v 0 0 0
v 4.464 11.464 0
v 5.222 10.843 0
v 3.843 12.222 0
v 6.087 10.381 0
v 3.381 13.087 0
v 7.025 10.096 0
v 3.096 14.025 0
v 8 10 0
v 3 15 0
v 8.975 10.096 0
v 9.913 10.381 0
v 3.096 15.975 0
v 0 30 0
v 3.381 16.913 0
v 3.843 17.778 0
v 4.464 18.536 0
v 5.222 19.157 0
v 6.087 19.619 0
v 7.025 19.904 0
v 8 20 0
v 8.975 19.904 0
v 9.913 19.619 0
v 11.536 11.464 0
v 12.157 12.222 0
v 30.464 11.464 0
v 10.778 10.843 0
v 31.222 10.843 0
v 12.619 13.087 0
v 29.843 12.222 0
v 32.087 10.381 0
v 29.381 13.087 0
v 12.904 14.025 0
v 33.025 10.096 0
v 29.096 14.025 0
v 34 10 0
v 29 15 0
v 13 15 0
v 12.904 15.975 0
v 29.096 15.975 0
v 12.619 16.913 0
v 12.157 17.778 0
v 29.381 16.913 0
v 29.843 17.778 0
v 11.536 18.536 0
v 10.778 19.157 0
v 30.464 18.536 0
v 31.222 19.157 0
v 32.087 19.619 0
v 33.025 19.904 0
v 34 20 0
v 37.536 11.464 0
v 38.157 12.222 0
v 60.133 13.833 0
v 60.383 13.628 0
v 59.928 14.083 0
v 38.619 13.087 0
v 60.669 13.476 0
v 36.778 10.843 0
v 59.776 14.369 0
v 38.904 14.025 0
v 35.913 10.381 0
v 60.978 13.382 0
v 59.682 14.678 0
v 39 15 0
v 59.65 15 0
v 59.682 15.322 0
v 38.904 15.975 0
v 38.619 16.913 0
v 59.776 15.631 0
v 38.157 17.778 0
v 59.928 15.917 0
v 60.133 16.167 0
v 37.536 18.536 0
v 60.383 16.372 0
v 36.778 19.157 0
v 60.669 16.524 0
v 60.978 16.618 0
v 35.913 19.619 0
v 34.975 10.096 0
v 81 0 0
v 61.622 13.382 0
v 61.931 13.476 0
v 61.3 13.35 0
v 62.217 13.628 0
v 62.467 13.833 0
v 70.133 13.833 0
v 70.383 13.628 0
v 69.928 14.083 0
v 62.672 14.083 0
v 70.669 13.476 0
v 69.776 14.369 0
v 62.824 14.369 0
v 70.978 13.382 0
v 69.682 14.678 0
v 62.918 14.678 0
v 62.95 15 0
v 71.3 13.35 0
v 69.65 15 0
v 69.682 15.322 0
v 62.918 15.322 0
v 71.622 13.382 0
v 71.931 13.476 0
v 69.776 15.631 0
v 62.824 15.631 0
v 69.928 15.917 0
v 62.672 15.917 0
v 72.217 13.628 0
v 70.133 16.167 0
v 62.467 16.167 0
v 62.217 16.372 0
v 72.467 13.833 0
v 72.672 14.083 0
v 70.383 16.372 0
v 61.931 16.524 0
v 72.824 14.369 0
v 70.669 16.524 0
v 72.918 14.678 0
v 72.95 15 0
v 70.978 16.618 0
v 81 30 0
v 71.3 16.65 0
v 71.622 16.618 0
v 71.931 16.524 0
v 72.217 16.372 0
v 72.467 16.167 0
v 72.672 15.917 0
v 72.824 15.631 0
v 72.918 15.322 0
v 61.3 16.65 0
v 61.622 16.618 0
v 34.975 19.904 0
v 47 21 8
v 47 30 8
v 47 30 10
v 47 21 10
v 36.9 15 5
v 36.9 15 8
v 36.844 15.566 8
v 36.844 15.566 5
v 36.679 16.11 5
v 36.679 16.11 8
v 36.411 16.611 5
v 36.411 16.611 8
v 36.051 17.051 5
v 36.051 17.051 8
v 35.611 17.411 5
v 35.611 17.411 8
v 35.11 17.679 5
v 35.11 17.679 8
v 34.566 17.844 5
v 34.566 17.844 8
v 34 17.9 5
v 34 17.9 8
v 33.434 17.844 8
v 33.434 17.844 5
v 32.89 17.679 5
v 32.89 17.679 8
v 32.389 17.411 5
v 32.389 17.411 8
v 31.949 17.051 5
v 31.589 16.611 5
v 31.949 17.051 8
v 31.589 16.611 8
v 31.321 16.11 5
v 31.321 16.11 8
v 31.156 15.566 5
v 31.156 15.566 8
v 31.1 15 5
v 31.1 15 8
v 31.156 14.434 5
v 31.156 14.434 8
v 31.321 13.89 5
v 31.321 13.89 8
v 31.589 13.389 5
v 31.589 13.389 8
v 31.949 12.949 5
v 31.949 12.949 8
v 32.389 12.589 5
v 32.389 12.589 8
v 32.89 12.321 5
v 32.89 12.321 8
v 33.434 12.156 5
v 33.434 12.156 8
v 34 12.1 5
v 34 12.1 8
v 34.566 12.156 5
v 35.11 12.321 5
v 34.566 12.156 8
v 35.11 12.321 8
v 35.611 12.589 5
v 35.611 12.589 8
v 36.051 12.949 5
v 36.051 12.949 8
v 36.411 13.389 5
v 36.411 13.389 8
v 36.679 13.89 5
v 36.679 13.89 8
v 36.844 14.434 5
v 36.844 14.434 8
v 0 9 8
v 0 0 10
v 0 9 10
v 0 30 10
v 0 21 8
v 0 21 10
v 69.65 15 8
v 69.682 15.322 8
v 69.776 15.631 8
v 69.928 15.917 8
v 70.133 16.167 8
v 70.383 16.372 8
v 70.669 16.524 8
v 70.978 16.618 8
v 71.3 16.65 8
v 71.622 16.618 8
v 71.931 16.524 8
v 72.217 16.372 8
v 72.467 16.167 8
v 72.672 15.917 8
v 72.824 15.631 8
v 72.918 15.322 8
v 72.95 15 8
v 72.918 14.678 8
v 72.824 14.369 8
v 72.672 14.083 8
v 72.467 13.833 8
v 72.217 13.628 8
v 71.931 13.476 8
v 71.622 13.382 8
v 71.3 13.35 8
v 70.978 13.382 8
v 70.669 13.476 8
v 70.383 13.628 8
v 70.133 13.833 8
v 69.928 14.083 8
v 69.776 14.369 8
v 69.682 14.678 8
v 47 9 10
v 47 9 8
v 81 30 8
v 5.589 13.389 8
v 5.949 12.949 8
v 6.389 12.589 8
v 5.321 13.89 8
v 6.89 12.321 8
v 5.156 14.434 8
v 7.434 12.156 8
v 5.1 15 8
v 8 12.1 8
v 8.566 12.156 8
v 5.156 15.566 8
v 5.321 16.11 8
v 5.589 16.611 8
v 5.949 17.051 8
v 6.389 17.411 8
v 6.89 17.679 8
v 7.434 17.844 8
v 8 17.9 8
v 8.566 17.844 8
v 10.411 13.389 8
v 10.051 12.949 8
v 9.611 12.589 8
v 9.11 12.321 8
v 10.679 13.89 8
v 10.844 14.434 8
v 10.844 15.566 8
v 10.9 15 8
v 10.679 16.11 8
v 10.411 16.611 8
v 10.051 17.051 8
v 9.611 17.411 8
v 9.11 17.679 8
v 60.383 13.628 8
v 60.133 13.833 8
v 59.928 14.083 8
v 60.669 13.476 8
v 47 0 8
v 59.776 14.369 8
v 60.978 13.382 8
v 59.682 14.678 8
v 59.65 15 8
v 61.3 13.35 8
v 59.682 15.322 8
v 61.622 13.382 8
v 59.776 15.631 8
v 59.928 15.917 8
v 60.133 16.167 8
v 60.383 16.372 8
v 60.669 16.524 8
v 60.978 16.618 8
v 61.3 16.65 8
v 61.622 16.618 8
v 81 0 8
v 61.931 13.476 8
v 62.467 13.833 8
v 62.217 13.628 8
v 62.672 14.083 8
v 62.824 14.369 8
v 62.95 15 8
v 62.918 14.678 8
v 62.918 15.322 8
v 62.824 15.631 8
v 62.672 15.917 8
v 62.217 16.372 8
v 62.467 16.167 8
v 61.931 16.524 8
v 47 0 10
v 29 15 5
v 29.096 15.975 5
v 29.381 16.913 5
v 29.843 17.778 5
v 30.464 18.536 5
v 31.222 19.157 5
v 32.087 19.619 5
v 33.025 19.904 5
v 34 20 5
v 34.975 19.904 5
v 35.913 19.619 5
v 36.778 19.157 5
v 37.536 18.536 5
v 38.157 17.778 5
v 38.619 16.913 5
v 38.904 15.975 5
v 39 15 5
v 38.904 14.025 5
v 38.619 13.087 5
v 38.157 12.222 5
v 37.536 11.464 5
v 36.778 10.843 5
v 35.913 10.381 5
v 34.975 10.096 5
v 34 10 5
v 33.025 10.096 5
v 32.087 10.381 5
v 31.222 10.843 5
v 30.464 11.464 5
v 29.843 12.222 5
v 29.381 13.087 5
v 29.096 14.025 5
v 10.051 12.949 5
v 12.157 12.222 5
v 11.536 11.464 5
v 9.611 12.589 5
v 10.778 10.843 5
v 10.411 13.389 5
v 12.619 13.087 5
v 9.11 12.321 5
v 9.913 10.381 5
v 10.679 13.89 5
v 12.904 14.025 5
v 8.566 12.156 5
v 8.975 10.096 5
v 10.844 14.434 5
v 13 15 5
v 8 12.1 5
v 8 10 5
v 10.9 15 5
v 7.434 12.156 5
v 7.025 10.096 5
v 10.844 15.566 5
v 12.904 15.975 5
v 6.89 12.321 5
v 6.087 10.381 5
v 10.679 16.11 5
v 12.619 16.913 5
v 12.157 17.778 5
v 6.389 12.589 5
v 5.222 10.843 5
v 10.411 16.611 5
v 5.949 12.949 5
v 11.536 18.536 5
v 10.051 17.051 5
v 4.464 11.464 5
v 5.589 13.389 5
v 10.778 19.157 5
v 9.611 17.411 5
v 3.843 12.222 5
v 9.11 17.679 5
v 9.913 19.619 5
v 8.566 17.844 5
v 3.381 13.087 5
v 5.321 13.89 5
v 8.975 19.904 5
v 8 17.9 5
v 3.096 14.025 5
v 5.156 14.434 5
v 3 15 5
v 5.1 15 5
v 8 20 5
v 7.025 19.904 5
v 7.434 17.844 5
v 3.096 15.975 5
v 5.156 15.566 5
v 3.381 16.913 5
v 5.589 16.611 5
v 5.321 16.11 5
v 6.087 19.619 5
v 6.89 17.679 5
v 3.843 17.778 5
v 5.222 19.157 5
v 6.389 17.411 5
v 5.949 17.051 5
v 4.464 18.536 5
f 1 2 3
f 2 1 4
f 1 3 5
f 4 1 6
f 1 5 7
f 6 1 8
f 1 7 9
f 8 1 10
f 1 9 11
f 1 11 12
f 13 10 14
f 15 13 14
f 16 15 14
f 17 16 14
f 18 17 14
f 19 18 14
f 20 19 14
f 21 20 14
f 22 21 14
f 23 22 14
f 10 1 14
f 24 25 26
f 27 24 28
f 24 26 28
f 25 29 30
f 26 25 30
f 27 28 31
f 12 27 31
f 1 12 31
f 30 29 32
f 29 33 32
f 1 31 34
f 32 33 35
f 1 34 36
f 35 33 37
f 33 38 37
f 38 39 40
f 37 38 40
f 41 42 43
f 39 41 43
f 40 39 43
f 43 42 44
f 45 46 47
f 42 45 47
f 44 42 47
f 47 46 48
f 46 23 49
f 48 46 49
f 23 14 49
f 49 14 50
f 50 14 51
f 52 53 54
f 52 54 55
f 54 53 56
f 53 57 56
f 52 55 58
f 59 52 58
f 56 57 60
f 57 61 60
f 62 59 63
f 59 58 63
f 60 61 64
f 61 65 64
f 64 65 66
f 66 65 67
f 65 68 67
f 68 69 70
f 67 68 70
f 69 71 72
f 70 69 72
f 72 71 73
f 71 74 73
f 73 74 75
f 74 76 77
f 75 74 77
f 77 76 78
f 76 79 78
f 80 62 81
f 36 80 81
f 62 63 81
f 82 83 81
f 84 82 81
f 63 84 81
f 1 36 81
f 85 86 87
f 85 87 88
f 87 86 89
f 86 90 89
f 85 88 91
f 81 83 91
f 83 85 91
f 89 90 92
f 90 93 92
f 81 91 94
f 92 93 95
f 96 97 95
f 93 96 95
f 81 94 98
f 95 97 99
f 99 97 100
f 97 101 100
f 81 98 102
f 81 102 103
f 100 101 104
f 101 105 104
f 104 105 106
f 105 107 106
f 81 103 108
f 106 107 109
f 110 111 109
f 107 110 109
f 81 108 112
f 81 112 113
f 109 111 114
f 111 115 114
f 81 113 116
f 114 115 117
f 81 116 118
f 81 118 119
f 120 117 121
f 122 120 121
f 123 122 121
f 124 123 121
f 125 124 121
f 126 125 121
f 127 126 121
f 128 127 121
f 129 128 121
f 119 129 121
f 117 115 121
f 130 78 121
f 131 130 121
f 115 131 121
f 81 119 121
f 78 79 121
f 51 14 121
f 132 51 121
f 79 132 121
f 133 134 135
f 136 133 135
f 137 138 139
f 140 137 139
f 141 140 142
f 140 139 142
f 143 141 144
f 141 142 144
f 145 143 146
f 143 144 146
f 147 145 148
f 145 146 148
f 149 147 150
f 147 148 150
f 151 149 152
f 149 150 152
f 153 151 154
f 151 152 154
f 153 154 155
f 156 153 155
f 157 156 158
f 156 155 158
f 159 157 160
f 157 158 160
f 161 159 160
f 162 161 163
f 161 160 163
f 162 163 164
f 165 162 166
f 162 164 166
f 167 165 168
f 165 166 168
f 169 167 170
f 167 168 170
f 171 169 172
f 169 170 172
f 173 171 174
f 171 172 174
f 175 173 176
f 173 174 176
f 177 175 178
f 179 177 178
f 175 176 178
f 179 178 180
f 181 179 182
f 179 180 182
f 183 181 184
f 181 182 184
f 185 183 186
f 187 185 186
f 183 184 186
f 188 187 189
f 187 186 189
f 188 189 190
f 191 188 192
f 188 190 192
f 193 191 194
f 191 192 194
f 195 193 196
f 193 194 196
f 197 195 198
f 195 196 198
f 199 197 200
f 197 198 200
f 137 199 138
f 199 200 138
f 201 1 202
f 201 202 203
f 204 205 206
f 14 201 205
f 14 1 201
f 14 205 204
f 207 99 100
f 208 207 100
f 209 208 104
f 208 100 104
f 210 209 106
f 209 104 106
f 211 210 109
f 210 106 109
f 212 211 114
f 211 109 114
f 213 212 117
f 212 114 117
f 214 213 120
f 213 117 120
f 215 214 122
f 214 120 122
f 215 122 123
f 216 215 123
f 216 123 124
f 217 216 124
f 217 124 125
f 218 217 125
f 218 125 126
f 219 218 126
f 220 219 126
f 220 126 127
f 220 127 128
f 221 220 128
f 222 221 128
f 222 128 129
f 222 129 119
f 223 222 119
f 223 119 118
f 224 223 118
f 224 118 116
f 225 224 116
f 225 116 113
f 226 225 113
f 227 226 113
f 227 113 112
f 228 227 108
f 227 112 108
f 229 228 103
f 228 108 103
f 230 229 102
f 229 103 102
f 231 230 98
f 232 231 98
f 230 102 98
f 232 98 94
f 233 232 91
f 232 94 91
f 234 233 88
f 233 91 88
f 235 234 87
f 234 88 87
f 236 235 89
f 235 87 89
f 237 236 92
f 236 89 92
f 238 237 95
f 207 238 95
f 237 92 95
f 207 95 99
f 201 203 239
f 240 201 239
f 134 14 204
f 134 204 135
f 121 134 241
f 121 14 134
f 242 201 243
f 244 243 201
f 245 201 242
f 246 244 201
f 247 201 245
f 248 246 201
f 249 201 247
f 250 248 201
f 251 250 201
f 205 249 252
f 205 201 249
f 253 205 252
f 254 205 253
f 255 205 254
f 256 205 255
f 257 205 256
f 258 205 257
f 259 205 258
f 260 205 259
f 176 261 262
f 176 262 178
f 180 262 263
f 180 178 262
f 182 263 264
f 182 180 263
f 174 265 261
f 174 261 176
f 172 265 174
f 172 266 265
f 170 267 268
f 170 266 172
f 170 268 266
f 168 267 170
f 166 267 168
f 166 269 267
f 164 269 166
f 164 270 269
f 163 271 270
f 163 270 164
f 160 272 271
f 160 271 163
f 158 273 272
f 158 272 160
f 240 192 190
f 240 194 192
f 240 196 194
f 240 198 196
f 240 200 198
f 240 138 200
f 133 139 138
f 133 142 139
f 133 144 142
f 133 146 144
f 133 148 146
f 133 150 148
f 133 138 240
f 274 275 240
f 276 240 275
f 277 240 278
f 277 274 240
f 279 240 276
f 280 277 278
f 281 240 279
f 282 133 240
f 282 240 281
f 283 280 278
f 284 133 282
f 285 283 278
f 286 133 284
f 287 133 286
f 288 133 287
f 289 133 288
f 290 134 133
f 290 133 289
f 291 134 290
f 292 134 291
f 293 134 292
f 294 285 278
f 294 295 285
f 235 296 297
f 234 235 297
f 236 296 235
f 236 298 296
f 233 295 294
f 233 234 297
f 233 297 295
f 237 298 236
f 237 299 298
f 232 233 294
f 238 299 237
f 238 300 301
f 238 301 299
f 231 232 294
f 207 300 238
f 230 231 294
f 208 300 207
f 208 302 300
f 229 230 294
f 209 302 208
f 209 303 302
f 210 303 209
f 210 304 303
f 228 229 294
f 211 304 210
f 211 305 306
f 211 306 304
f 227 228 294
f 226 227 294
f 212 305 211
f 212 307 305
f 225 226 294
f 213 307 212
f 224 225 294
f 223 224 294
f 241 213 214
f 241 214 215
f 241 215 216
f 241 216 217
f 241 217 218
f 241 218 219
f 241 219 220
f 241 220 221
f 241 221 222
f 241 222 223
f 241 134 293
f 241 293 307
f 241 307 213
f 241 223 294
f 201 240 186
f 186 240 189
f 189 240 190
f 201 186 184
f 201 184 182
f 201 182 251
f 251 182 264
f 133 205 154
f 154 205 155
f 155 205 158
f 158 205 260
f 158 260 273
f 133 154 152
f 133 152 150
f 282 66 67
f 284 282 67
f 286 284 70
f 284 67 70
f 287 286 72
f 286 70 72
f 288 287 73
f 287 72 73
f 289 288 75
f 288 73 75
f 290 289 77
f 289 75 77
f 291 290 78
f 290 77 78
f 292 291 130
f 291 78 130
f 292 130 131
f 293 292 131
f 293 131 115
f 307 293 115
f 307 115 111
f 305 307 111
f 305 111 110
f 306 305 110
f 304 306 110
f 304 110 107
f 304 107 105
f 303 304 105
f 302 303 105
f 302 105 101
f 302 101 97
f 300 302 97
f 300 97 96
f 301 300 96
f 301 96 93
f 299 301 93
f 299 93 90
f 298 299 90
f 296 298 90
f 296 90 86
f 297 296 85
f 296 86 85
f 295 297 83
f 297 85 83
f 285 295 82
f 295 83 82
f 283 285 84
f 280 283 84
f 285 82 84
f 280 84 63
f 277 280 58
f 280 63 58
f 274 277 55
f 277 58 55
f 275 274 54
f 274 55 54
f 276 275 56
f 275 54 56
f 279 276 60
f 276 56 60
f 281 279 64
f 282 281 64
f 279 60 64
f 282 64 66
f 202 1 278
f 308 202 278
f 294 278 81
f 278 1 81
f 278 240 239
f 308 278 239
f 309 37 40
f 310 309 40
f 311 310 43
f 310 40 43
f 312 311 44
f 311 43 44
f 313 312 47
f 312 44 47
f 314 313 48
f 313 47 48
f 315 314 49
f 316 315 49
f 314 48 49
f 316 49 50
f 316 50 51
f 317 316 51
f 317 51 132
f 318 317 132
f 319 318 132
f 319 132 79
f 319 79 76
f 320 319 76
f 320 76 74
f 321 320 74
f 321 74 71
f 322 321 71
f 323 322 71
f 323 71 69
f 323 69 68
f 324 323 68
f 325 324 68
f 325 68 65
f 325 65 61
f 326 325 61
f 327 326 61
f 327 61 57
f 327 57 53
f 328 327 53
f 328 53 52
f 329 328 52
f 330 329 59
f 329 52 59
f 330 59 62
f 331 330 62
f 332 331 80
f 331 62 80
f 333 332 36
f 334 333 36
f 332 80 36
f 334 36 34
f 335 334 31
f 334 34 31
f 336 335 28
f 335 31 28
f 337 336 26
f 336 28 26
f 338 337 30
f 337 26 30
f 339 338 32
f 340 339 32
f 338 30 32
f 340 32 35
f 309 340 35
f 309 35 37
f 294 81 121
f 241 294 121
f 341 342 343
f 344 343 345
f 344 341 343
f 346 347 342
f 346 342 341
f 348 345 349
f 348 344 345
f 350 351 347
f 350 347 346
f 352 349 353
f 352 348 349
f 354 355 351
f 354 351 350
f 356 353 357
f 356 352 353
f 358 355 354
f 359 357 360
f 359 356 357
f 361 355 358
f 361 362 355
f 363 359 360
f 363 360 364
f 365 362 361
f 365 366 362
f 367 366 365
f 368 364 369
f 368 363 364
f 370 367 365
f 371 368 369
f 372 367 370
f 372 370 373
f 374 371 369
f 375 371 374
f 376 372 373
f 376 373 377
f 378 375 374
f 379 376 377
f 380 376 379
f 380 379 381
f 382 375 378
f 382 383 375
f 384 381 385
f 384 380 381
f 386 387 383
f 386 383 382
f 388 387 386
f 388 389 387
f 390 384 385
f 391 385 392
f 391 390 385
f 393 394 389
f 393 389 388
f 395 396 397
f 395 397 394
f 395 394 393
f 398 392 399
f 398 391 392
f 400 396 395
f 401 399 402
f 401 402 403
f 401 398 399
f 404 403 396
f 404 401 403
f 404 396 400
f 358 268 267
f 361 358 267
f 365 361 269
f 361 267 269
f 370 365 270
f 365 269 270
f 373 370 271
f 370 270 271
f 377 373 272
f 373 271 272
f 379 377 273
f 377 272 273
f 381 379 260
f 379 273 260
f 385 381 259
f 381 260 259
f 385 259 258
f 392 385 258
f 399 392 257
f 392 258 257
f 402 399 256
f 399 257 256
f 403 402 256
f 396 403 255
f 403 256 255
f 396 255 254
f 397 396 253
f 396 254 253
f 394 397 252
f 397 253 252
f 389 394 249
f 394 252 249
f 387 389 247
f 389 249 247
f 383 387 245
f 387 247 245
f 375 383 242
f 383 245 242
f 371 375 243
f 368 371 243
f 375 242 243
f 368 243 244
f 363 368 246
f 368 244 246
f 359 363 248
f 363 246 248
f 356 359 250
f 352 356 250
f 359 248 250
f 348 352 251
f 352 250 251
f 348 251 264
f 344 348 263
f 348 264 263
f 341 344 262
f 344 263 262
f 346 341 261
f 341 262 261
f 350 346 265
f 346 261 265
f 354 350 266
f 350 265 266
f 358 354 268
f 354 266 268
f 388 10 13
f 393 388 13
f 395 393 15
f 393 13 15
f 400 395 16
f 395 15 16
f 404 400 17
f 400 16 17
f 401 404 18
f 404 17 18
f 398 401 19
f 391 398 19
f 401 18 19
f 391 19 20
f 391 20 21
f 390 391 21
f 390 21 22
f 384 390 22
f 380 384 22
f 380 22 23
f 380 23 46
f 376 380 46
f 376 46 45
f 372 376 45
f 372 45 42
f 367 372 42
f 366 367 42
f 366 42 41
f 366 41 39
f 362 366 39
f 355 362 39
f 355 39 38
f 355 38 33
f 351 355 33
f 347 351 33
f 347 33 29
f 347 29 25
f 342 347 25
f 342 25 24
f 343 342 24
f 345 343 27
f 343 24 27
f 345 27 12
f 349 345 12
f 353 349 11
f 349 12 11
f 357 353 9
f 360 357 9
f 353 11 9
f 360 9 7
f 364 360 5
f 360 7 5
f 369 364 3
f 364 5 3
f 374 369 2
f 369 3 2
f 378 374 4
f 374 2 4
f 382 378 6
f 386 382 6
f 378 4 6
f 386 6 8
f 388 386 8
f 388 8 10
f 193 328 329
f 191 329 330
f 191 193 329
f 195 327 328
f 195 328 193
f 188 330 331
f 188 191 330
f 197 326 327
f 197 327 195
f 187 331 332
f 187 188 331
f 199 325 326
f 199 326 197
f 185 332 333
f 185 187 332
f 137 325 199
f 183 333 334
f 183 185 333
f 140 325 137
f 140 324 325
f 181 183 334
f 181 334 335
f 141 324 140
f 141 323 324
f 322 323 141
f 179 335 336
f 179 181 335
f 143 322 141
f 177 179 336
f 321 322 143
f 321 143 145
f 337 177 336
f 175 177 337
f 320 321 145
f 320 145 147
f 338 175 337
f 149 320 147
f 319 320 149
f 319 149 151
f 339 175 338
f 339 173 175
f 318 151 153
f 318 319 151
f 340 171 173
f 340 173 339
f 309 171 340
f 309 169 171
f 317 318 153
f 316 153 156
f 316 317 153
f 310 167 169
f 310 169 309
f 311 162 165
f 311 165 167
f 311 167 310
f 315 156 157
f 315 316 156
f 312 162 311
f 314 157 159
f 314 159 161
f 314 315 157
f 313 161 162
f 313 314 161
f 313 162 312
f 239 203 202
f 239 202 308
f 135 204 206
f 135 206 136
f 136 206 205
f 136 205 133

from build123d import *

# Parameters (mm, degrees)
SKETCH_1_W                   = 81
SKETCH_1_H                   = 30
EXTRUDE_1_DEPTH              = 10
HOLE_WIZARD_M5_1_D           = 5.8
HOLE_WIZARD_M5_1_CBORE_D     = 10
HOLE_WIZARD_M5_1_CBORE_DEPTH = 5
SKETCH_4_W                   = 81
SKETCH_4_H                   = 12
CUT_EXTRUDE_1_DEPTH          = 2
CUT_EXTRUDE_2_DEPTH          = 85.273364713
CUT_EXTRUDE_2_DEPTH_BACK     = 85.273364713
SKETCH_5_W                   = 34
SKETCH_5_H                   = 2
HOLE_WIZARD_M4_1_D           = 3.3


with BuildPart() as part:
    # 草图1 → 凸台-拉伸1 (new body)
    with BuildSketch(Plane.XY):
        with Locations((40.5, 15)):
            Rectangle(SKETCH_1_W, SKETCH_1_H)
    extrude(amount=EXTRUDE_1_DEPTH)

    # M5 六角凹头螺钉的柱形沉头孔1 (through all)
    with Locations(Plane(origin=(0, 0, 0), x_dir=(-1, 0, 0), z_dir=(0, 0, -1))):
        with Locations((-34, 15), (-8, 15)):
            CounterBoreHole(HOLE_WIZARD_M5_1_D / 2, HOLE_WIZARD_M5_1_CBORE_D / 2, HOLE_WIZARD_M5_1_CBORE_DEPTH)

    # 草图4 → 切除-拉伸1 (cut)
    with BuildSketch(Plane.XY.offset(10)):
        with Locations((40.5, 15)):
            Rectangle(SKETCH_4_W, SKETCH_4_H)
    extrude(amount=-CUT_EXTRUDE_1_DEPTH, mode=Mode.SUBTRACT)

    # 草图5 → 切除-拉伸2 (cut, two sides: drawn at the far end of the back side and taken through both)
    with BuildSketch(Plane.XZ.offset(-21).offset(-CUT_EXTRUDE_2_DEPTH_BACK)):
        with Locations((64, 9)):
            Rectangle(SKETCH_5_W, SKETCH_5_H)
    extrude(amount=CUT_EXTRUDE_2_DEPTH + CUT_EXTRUDE_2_DEPTH_BACK, mode=Mode.SUBTRACT)

    # M4 螺纹孔1 (through all)
    with Locations(Plane.XY.offset(8)):
        with Locations((71.3, 15), (61.3, 15)):
            Hole(HOLE_WIZARD_M4_1_D / 2)


solid = part.part
